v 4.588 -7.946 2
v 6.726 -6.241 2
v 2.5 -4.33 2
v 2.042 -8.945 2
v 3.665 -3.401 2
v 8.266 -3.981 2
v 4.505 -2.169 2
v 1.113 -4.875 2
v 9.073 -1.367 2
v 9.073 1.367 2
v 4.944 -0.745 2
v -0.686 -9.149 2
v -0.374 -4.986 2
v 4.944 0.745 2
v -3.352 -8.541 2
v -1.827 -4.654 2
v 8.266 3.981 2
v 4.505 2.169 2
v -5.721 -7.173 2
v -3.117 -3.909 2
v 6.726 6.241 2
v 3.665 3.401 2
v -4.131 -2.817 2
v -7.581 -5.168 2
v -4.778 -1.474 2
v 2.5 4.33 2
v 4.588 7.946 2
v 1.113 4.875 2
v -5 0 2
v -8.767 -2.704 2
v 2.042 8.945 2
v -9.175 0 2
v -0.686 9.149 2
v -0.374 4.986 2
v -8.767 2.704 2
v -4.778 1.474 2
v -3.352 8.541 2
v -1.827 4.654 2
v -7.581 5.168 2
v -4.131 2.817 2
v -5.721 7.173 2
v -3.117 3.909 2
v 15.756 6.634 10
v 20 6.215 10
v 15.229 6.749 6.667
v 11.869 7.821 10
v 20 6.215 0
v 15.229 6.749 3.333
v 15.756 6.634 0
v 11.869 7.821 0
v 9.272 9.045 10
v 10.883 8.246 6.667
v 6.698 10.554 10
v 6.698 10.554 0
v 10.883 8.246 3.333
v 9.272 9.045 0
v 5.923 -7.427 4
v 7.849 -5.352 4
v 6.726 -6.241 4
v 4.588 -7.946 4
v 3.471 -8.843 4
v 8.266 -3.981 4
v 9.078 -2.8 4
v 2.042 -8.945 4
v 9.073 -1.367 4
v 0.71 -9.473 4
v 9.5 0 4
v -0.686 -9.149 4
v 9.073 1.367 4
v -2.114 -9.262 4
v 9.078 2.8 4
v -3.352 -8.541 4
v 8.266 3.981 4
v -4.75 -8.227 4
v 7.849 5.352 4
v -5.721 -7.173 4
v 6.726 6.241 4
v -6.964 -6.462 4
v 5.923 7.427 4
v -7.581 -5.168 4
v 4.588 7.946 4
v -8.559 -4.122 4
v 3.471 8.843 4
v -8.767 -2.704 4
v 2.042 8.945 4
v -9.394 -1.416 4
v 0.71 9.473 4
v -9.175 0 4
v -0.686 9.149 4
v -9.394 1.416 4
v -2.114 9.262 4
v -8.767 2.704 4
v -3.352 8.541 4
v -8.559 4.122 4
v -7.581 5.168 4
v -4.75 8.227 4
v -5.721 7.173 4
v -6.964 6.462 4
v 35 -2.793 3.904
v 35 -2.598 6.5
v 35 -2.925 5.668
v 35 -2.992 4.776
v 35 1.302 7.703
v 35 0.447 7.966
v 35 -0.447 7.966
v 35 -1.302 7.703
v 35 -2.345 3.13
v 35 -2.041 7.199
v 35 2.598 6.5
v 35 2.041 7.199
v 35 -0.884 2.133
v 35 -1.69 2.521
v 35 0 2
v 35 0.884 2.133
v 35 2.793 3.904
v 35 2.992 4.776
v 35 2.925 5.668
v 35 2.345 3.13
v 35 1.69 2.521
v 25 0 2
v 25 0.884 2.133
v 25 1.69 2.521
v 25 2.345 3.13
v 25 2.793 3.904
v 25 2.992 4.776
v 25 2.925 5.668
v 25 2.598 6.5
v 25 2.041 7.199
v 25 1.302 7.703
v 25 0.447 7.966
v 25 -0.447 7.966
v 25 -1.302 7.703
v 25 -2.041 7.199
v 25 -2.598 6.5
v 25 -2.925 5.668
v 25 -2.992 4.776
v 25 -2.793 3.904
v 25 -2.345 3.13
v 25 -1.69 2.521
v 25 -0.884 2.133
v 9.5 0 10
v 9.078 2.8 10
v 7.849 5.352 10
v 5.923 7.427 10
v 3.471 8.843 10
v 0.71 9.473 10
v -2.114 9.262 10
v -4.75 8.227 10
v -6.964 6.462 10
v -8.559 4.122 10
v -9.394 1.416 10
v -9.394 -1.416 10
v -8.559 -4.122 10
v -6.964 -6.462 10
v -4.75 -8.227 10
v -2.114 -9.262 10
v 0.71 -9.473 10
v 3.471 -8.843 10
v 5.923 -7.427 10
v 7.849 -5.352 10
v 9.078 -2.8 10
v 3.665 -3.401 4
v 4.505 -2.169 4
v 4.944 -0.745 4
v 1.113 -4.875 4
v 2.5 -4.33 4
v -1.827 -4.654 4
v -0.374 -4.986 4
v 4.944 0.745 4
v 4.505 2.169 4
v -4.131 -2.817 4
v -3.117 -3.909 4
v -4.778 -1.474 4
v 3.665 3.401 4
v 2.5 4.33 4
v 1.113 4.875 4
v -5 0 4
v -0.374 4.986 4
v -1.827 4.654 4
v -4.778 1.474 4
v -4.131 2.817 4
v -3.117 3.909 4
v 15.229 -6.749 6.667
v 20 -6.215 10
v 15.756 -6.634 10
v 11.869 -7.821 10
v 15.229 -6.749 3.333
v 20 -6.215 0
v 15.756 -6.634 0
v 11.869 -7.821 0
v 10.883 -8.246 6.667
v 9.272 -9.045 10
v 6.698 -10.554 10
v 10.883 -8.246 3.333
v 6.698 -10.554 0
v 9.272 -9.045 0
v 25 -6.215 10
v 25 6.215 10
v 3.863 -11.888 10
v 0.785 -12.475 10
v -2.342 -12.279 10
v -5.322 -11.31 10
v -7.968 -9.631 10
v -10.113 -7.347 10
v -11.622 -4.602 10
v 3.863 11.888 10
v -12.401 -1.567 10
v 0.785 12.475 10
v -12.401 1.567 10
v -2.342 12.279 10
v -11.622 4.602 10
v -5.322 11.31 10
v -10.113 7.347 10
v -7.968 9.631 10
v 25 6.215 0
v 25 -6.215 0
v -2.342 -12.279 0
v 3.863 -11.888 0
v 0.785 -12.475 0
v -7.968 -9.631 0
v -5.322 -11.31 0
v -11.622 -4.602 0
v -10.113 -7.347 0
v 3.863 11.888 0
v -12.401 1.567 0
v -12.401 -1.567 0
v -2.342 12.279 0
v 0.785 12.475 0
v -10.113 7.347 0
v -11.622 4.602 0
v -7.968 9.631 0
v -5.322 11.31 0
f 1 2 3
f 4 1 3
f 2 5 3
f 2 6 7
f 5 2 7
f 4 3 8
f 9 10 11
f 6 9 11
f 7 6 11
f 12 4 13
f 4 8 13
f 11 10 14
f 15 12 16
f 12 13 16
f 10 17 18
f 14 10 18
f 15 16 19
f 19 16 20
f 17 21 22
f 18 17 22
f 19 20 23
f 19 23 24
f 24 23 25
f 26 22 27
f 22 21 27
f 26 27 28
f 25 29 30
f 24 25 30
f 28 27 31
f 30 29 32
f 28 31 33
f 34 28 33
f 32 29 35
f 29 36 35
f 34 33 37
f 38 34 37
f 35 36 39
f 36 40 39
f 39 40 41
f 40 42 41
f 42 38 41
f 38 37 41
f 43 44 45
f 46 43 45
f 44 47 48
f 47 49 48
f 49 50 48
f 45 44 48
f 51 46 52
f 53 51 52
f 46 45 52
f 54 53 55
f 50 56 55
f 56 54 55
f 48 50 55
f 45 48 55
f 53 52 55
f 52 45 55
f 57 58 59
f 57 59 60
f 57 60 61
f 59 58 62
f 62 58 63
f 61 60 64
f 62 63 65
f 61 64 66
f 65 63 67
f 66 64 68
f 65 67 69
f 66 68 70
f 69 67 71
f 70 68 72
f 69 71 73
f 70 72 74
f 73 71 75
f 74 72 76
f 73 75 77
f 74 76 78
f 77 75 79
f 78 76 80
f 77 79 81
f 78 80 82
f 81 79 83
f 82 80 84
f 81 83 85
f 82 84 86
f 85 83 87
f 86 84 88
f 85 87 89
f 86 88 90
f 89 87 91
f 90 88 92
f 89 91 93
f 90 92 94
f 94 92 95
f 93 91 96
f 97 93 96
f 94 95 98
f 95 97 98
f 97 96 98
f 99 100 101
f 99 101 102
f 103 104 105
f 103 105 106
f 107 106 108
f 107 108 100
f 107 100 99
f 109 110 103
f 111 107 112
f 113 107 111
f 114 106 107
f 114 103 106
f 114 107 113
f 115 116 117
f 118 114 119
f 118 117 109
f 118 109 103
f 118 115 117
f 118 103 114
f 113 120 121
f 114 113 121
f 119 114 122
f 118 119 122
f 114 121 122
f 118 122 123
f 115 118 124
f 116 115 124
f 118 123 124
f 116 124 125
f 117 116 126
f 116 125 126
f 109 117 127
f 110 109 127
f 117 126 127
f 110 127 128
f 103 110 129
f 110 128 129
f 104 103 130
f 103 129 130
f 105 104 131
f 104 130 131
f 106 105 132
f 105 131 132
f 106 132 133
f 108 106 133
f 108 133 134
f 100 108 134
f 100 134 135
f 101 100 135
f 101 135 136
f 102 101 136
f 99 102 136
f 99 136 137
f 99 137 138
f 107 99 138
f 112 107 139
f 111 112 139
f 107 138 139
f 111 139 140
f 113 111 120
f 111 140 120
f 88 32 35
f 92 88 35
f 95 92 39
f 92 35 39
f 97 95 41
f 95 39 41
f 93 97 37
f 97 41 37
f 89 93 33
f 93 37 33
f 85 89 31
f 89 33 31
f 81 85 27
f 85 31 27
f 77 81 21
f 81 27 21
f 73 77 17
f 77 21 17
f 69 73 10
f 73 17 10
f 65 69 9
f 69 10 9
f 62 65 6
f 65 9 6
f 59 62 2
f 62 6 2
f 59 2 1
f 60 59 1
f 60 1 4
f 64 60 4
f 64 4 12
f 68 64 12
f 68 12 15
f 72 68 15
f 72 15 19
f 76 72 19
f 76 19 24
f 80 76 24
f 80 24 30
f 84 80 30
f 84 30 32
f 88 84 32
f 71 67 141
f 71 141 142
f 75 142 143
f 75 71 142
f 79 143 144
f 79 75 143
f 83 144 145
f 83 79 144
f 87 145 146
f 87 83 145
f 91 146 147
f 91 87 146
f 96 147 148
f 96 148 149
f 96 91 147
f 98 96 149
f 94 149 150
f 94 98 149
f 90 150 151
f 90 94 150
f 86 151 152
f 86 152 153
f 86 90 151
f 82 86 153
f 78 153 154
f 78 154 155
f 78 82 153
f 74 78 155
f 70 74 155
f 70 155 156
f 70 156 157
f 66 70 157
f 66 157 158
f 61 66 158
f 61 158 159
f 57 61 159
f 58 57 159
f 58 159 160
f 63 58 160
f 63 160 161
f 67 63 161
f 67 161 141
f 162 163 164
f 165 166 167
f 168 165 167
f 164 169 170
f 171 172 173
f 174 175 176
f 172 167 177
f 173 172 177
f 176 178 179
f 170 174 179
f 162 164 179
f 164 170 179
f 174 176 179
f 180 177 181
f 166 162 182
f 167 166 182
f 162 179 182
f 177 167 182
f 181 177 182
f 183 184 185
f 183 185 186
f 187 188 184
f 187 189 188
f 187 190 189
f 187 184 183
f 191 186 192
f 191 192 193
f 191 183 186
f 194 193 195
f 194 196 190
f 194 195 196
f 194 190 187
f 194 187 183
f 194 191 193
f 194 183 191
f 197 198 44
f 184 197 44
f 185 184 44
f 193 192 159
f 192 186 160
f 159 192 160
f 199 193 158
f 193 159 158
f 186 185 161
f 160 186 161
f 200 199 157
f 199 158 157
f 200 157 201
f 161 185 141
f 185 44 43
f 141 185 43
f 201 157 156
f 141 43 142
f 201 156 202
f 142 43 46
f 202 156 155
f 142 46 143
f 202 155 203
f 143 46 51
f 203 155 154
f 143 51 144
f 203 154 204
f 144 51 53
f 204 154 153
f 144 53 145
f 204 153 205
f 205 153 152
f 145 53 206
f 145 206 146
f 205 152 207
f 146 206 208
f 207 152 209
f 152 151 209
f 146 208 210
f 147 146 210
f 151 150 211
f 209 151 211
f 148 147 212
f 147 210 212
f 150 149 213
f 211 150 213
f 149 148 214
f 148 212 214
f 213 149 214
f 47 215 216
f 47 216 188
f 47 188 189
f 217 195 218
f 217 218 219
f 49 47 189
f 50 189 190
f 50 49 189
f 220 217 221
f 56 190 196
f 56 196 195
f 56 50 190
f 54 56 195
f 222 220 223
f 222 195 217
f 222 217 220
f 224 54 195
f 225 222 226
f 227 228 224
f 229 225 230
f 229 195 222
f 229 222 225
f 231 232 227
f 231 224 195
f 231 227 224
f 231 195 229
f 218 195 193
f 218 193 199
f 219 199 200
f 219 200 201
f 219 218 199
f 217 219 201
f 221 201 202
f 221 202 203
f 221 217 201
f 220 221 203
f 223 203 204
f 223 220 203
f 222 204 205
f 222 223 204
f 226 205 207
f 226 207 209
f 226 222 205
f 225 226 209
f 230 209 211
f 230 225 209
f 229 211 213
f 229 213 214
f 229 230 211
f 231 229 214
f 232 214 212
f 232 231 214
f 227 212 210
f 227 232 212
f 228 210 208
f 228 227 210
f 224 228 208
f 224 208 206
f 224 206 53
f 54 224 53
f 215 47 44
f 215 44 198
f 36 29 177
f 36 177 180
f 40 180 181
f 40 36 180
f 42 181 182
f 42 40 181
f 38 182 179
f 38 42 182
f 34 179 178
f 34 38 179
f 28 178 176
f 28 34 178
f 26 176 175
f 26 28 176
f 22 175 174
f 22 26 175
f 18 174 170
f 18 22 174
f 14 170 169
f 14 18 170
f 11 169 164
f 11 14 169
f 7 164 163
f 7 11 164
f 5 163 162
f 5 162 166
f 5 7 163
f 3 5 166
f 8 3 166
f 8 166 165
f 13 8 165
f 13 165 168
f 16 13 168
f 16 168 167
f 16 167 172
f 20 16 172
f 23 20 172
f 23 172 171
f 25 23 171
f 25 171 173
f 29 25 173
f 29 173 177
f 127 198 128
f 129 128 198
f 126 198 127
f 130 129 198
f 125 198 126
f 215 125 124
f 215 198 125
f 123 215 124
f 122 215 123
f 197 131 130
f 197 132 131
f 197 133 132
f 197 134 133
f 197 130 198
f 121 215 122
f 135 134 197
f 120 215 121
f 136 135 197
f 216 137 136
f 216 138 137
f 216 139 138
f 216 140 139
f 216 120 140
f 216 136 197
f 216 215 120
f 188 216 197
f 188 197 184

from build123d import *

# Parameters (mm, degrees)
SKETCH1_R           = 9.5
BOSS_EXTRUDE1_DEPTH = 10
SKETCH2_R           = 12.5
BOSS_EXTRUDE2_DEPTH = 2
SKETCH3_R           = 5
BOSS_EXTRUDE3_DEPTH = 4
SKETCH4_R           = 12.5
SKETCH4_R_2         = 9.175
BOSS_EXTRUDE5_DEPTH = 4
SKETCH5_R           = 3
BOSS_EXTRUDE6_DEPTH = 10


with BuildPart() as part:
    # Sketch1 → Boss-Extrude1 (new body)
    with BuildSketch(Plane.XY):
        with BuildLine():
            Line((20, 6.21521961), (25, 6.21521961))
            Line((25, 6.21521961), (25, -6.21521961))
            Line((25, -6.21521961), (20, -6.21521961))
            add(Edge.make_bspline(
                [(20, -6.21521961), (14.928036397, -6.21521961), (10.891454701, -7.892862666), (6.69762749, -10.554230716)],
                knots=[0, 0, 0, 0, 1, 1, 1, 1], degree=3))
            ThreePointArc((6.69762749, -10.554230716), (-12.5, 0), (6.69762749, 10.554230716))
            add(Edge.make_bspline(
                [(20, 6.21521961), (14.928036397, 6.21521961), (10.891454701, 7.892862666), (6.69762749, 10.554230716)],
                knots=[0, 0, 0, 0, 1, 1, 1, 1], degree=3))
        make_face()
        Circle(SKETCH1_R, mode=Mode.SUBTRACT)
    extrude(amount=BOSS_EXTRUDE1_DEPTH)

    # Sketch2 → Boss-Extrude2 (add)
    with BuildSketch(Plane(origin=(0, 0, 0), x_dir=(-1, 0, 0), z_dir=(0, 0, -1))):
        Circle(SKETCH2_R)
    extrude(amount=-BOSS_EXTRUDE2_DEPTH)

    # Sketch3 → Boss-Extrude3 (add)
    with BuildSketch(Plane(origin=(0, 0, 0), x_dir=(-1, 0, 0), z_dir=(0, 0, -1))):
        Circle(SKETCH3_R)
    extrude(amount=-BOSS_EXTRUDE3_DEPTH)

    # Sketch4 → Boss-Extrude5 (add)
    with BuildSketch(Plane(origin=(0, 0, 0), x_dir=(-1, 0, 0), z_dir=(0, 0, -1))):
        Circle(SKETCH4_R)
        Circle(SKETCH4_R_2, mode=Mode.SUBTRACT)
    extrude(amount=-BOSS_EXTRUDE5_DEPTH)

    # Sketch5 → Boss-Extrude6 (add)
    with BuildSketch(Plane(origin=(25, 0, 0), x_dir=(0, 0, -1), z_dir=(1, 0, 0))):
        with Locations((-5, 0)):
            Circle(SKETCH5_R)
    extrude(amount=BOSS_EXTRUDE6_DEPTH)


solid = part.part
